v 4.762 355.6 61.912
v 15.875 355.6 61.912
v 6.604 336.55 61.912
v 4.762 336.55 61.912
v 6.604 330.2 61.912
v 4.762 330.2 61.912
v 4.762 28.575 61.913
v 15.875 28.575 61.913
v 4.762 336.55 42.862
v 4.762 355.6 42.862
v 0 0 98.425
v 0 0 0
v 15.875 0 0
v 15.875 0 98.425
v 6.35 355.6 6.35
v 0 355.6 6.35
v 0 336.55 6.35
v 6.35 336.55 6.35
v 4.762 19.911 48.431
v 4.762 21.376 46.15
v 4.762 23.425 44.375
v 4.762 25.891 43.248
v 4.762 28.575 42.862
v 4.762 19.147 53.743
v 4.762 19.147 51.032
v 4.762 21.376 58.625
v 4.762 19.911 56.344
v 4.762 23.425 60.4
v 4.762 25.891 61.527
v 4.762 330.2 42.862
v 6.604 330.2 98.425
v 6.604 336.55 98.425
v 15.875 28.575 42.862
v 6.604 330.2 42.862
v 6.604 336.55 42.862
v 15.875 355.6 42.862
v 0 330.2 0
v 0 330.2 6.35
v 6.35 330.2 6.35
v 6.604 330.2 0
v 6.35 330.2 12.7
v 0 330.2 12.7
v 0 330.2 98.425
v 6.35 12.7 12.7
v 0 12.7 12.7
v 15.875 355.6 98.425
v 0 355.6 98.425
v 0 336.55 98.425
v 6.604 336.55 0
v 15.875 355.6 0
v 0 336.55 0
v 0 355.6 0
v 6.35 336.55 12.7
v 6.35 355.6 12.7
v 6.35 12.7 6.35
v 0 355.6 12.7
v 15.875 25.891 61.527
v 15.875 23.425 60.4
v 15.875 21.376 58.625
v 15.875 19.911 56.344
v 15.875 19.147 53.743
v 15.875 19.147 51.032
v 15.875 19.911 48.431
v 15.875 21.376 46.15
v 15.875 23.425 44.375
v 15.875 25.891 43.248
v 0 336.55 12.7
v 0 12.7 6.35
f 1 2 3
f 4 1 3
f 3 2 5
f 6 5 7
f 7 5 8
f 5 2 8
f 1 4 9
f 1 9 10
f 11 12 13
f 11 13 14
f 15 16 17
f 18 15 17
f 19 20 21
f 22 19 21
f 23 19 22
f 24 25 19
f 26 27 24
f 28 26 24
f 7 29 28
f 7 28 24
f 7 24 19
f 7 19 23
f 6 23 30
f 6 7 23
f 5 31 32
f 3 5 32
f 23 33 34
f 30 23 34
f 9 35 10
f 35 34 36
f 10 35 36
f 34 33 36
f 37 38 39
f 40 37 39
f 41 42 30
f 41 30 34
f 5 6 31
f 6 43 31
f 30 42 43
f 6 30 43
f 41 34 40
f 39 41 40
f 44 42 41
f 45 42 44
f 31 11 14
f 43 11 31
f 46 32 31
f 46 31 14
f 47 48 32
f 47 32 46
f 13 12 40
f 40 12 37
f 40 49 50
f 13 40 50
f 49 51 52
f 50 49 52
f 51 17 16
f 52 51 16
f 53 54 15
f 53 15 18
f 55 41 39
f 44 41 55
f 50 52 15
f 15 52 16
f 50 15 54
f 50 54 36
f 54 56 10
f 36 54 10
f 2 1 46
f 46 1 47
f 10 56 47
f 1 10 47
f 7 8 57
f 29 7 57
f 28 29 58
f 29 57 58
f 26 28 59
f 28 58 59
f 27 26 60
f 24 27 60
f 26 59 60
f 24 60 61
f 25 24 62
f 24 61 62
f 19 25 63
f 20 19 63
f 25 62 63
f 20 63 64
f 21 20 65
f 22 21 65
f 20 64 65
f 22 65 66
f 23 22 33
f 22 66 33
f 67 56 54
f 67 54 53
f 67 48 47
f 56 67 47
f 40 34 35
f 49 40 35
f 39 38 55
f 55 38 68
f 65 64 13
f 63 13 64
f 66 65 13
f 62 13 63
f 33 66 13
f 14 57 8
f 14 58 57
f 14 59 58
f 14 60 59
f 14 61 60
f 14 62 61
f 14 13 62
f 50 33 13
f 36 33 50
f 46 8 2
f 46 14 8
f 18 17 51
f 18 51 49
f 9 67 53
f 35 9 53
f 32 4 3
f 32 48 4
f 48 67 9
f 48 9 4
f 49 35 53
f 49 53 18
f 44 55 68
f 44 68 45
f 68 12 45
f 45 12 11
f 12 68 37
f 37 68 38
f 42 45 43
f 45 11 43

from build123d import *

# Parameters (mm, degrees)
F0_W     = 355.6
F0_H     = 98.425
F1_DEPTH = 15.875
F3_DEPTH = 11.1125
F4_W     = 342.9
F4_H     = 6.35
F5_DEPTH = 6.35
F6_W     = 6.604
F6_H     = 6.35
F7_DEPTH = 98.425


with BuildPart() as f1:
    # F0 (on Right) → F1 (new body)
    with BuildSketch(Plane.YZ):
        with Locations((177.8, 49.2125)):
            Rectangle(F0_W, F0_H)
    extrude(amount=F1_DEPTH)

    # F2 (on face) → F3 (cut)
    with BuildSketch(Plane.YZ.offset(15.875)):
        with BuildLine():
            ThreePointArc((28.575, 61.9125), (19.05, 52.3875), (28.575, 42.8625))
            Line((28.575, 42.8625), (355.6, 42.8625))
            Line((355.6, 42.8625), (355.6, 52.3875))
            Line((355.6, 52.3875), (355.6, 61.9125))
            Line((355.6, 61.9125), (28.575, 61.9125))
        make_face()
    extrude(amount=-F3_DEPTH, mode=Mode.SUBTRACT)

    # F4 (on face) → F5 (cut)
    with BuildSketch(Plane(origin=(0, 0, 0), x_dir=(0, -1, 0), z_dir=(-1, 0, 0))):
        with Locations((-184.15, 9.525)):
            Rectangle(F4_W, F4_H)
    extrude(amount=-F5_DEPTH, mode=Mode.SUBTRACT)

    # F6 (on face) → F7 (cut, through all)
    with BuildSketch(Plane.XY.offset(98.425)):
        with Locations((3.302, 333.375)):
            Rectangle(F6_W, F6_H)
    extrude(amount=-F7_DEPTH, mode=Mode.SUBTRACT)


solid = f1.part
